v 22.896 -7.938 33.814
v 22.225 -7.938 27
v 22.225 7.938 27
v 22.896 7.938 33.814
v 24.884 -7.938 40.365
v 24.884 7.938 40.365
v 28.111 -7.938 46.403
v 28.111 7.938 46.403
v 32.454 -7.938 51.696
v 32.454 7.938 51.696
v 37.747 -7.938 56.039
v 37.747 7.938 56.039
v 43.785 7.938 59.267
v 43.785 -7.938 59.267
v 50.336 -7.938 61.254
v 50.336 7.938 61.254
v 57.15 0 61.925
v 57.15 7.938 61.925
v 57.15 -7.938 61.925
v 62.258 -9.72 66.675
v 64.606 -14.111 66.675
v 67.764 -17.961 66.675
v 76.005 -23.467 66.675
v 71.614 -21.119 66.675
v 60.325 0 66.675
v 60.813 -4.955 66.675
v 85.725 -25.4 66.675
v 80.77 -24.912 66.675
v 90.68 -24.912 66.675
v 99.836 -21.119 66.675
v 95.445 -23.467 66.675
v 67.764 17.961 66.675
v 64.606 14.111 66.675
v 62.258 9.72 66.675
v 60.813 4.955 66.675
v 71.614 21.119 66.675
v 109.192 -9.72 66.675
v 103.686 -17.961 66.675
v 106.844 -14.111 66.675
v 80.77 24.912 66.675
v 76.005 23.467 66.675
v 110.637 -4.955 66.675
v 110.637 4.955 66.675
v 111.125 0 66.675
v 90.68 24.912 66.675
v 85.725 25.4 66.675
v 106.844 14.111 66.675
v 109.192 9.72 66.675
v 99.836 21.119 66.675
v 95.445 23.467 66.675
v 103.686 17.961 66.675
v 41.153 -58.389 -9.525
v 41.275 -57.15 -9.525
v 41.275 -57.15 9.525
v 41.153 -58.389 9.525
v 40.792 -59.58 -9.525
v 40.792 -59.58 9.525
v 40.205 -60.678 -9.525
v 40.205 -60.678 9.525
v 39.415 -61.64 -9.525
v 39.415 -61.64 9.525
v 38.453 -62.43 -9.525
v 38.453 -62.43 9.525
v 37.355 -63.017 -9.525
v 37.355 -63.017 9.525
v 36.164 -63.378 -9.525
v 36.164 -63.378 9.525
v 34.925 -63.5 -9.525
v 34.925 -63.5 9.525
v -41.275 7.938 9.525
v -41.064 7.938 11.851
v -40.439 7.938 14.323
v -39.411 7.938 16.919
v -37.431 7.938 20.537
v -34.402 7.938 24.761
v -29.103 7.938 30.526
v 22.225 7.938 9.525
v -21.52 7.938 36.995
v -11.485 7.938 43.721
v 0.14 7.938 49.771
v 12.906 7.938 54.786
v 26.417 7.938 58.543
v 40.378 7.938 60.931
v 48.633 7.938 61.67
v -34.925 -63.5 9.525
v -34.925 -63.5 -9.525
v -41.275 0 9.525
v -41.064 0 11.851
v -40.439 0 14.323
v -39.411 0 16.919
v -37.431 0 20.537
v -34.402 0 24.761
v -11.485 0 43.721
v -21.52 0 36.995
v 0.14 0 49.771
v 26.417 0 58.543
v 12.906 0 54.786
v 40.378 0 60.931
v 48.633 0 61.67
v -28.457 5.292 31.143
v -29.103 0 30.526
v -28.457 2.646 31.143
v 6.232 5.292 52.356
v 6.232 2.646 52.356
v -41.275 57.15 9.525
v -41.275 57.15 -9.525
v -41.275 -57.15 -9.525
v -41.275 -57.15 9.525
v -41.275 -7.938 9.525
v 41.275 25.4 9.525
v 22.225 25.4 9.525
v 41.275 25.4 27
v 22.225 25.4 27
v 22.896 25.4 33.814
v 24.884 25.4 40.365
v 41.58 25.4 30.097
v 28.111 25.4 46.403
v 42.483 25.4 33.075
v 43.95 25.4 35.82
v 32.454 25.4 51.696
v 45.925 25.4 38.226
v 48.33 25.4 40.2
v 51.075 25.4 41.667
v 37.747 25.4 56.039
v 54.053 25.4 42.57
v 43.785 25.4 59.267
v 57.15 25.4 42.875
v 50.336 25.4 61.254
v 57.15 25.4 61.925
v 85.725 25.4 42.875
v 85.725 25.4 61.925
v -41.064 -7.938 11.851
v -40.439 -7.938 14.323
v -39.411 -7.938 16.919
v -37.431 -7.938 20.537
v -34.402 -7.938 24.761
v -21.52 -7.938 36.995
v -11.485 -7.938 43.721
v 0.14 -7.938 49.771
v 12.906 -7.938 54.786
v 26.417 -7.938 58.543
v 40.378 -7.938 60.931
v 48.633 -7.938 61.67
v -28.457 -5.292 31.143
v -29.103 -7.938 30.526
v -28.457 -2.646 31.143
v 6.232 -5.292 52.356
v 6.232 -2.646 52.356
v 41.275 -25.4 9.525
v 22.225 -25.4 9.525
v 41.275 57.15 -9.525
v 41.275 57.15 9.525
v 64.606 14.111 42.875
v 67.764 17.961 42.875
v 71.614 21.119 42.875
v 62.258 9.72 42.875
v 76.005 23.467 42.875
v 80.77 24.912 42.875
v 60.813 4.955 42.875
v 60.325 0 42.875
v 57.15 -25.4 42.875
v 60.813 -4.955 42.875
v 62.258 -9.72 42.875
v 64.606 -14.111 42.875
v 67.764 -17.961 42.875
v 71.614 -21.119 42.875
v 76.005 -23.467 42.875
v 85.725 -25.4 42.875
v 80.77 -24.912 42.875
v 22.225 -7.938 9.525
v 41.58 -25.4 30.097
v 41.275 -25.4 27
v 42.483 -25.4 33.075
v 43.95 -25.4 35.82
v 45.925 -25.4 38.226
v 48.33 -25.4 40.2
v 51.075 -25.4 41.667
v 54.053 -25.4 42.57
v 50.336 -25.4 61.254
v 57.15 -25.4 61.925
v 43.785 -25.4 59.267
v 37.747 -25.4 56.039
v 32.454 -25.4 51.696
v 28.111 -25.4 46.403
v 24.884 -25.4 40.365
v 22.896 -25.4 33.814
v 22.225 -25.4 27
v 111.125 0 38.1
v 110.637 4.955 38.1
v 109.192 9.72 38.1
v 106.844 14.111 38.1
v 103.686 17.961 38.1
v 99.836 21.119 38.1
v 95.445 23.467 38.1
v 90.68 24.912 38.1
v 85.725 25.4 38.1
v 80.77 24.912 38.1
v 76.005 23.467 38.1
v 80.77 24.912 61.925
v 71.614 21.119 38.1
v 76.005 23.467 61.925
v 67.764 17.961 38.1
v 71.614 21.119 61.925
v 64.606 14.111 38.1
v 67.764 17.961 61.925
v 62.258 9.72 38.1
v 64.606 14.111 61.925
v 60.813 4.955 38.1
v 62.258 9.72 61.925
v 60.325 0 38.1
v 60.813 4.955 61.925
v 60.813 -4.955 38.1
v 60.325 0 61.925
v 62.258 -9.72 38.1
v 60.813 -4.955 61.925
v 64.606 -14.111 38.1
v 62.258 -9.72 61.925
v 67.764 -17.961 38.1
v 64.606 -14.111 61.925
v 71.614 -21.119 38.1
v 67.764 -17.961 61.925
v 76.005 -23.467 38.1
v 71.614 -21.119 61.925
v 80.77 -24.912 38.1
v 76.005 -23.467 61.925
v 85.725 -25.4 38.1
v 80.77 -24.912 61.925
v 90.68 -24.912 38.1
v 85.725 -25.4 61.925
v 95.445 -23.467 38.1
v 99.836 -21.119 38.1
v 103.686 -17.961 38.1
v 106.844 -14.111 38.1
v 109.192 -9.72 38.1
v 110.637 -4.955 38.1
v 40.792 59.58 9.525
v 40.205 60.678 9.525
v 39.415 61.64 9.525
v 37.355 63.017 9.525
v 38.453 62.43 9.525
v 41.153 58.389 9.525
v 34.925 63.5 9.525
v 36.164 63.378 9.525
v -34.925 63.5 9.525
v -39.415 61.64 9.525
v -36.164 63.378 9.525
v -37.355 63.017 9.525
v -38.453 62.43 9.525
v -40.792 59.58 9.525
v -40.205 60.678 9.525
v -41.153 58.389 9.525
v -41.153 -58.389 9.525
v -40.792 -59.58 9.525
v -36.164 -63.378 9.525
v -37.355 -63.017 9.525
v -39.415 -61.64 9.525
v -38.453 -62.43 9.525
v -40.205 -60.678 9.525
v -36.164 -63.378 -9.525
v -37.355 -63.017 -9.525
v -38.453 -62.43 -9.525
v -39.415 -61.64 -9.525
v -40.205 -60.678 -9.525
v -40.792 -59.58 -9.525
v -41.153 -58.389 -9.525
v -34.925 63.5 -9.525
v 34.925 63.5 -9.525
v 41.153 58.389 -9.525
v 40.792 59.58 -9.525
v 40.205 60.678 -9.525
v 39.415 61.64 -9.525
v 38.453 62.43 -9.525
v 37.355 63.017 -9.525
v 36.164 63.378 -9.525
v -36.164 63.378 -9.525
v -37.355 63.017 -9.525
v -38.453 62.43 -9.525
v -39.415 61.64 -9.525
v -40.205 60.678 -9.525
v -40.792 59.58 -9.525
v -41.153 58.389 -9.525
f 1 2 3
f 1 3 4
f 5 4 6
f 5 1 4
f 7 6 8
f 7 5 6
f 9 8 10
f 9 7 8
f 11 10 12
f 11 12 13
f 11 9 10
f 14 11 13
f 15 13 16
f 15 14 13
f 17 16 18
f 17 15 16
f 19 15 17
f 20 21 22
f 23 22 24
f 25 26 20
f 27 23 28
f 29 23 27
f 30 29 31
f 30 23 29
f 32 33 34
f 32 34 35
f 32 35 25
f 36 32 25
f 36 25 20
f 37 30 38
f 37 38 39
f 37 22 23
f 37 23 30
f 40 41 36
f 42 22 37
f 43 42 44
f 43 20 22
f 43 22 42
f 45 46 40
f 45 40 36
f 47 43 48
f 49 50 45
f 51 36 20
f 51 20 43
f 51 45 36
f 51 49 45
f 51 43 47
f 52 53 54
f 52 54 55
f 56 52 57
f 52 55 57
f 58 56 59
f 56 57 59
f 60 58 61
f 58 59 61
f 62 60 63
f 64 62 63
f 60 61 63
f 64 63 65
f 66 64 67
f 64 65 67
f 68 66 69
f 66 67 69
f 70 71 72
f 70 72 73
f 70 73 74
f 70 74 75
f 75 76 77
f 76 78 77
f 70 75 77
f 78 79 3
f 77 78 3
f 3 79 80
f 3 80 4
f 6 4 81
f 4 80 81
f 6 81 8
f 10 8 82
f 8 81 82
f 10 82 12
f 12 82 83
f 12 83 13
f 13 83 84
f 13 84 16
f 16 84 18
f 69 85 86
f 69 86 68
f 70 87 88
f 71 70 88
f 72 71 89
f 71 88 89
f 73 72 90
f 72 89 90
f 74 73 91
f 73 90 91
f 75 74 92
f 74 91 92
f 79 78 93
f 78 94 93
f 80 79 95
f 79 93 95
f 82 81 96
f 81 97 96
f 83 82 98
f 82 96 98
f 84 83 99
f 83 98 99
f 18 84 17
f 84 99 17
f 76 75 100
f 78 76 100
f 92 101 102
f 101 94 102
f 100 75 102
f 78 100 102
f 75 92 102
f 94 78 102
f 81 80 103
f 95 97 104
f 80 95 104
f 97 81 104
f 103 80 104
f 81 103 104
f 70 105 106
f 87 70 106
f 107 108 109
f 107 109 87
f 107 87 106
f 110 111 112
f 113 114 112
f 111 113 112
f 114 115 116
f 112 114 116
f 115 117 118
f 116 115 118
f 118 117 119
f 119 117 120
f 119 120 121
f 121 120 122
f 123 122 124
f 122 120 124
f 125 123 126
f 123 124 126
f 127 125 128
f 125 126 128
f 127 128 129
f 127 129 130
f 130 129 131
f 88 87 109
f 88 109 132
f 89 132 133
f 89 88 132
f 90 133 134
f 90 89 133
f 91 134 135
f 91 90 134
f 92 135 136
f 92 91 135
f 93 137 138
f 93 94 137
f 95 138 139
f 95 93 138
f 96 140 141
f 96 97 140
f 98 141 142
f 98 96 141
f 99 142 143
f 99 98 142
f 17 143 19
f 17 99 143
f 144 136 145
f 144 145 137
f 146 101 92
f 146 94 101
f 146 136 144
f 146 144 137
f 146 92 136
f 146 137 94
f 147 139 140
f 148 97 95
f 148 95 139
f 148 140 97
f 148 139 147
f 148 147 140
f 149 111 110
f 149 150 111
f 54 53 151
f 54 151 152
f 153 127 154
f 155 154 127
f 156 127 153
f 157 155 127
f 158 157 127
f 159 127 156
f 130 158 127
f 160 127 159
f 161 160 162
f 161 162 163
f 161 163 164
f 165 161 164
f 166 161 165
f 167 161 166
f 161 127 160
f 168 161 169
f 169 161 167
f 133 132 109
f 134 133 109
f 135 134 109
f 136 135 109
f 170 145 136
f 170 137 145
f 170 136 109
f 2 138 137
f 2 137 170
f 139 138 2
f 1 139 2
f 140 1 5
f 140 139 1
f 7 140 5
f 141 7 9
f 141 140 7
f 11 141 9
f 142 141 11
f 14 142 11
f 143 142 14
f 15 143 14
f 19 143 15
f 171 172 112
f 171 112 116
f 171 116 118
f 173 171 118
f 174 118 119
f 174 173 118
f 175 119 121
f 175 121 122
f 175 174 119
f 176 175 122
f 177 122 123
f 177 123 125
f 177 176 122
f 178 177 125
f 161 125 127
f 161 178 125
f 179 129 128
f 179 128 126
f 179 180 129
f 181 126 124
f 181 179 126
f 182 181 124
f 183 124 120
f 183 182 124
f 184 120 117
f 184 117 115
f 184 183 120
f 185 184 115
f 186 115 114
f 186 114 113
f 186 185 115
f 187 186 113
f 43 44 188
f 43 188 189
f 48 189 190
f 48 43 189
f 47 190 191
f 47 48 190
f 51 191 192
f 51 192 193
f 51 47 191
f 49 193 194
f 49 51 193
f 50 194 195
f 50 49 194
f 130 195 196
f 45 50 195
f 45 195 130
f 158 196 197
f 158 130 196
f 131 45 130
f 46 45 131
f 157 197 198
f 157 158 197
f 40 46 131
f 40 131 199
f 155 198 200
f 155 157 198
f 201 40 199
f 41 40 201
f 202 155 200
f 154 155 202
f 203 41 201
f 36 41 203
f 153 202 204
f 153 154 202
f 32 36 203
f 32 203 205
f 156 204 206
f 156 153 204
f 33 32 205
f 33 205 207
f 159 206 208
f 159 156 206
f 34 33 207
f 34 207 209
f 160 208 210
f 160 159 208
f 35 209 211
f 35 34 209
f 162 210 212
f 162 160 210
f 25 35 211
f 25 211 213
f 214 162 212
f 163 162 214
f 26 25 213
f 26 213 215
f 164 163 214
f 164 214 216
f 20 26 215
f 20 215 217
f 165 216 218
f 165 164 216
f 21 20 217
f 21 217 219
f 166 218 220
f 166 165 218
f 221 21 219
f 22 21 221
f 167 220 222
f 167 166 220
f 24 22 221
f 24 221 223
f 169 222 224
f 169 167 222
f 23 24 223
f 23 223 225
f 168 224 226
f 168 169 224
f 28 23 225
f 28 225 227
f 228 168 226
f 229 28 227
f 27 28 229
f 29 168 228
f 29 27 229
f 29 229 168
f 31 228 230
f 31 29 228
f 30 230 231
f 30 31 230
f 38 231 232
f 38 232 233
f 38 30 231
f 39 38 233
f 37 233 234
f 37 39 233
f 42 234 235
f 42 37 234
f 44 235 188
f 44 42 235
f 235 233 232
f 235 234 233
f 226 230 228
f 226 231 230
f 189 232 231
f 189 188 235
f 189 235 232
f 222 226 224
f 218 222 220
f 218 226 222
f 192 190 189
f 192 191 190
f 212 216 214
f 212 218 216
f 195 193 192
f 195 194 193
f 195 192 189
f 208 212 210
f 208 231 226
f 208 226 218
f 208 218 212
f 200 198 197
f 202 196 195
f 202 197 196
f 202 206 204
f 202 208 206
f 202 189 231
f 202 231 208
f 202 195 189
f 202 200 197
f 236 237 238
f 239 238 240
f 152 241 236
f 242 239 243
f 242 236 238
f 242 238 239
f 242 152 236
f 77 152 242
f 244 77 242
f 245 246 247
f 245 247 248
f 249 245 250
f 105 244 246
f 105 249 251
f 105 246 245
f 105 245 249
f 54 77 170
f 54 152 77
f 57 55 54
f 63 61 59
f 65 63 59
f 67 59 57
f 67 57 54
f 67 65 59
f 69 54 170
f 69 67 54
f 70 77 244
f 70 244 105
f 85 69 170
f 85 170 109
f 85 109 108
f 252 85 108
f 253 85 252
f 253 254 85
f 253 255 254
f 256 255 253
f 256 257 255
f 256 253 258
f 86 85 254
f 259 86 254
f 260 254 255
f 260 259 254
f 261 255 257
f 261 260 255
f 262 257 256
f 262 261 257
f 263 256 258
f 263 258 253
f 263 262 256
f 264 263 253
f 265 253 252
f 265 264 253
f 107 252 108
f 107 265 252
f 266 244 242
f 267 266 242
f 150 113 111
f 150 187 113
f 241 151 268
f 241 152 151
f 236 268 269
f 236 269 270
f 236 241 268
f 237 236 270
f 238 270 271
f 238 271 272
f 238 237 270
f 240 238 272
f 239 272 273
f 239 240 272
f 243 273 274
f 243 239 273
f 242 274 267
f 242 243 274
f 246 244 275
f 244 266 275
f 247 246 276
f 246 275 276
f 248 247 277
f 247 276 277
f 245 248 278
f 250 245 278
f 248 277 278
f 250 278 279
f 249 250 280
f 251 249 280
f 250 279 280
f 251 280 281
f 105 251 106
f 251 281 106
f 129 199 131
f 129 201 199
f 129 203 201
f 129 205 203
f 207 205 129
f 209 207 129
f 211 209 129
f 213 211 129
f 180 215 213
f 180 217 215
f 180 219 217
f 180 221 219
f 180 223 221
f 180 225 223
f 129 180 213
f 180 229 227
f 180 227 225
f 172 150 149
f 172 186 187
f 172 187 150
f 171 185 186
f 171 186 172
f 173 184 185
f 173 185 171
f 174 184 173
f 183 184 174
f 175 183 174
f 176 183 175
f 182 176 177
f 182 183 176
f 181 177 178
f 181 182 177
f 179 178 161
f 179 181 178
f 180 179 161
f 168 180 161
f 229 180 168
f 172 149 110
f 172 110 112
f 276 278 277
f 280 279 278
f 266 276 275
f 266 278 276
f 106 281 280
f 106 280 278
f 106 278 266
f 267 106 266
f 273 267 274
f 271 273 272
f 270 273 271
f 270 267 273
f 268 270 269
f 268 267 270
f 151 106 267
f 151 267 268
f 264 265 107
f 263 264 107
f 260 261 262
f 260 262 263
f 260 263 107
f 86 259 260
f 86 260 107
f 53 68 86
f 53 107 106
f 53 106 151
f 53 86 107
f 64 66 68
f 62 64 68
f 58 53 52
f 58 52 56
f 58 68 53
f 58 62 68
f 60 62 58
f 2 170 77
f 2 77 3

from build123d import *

# Parameters (mm, degrees)
F1_DEPTH = 63.5
F0_W     = 25.4
F0_H     = 19.05
F2_DEPTH = 25.4
F3_DEPTH = 7.9375
F5_R     = 6.35


with BuildPart() as f1:
    # F0 (on Front) → F1 (new body, symmetric)
    with BuildSketch(Plane.XZ):
        Polygon((41.275, -9.525), (41.275, 9.525), (22.225, 9.525), (-41.275, 9.525), (-41.275, -9.525), align=None)
    extrude(amount=F1_DEPTH, both=True)

    # F0 (on Front) → F3 (join, symmetric)
    with BuildSketch(Plane.XZ):
        with BuildLine():
            Line((-41.275, 9.525), (22.225, 9.525))
            Line((22.225, 9.525), (22.225, 27.0002))
            ThreePointArc((22.225, 27.0002), (32.4542956671, 51.6959043329), (57.15, 61.9252))
            add(Edge.make_bspline(
                [(-41.275, 9.525), (-41.275, 27.5978259742), (0, 61.9252), (57.15, 61.9252)],
                knots=[0, 0, 0, 0, 111.5045361635, 111.5045361635, 111.5045361635, 111.5045361635], degree=3))
        make_face()
    extrude(amount=F3_DEPTH, both=True)

    # F5
    f5_edges = [f1.edges().sort_by_distance(p)[0] for p in [
        (41.275, -63.5, 0),
        (-41.275, -63.5, 0),
        (41.275, 63.5, 0),
        (-41.275, 63.5, 0),
    ]]
    fillet(f5_edges, radius=F5_R)


with BuildPart() as f2:
    # F0 (on Front) → F2 (new body, symmetric)
    with BuildSketch(Plane.XZ):
        with BuildLine():
            Line((22.225, 9.525), (41.275, 9.525))
            Line((41.275, 9.525), (41.275, 27.0002))
            ThreePointArc((41.275, 27.0002), (45.9246798487, 38.2255201513), (57.15, 42.8752))
            Line((57.15, 42.8752), (60.325, 42.8752))
            Line((60.325, 42.8752), (60.325, 61.9252))
            Line((60.325, 61.9252), (57.15, 61.9252))
            ThreePointArc((57.15, 61.9252), (32.4542956671, 51.6959043329), (22.225, 27.0002))
            Line((22.225, 27.0002), (22.225, 9.525))
        make_face()
        with Locations((73.025, 52.4002)):
            Rectangle(F0_W, F0_H)
    extrude(amount=F2_DEPTH, both=True)

    # F0 (on Front) → F4 (revolve)
    with BuildSketch(Plane.XZ):
        Polygon((85.725, 61.9252), (85.725, 42.8752), (85.725, 38.1), (111.125, 38.1), (111.125, 66.675), (85.725, 66.675), align=None)
    revolve(axis=Axis((85.725, 0, 52.3875), (0, 0, 1)))


solid = Compound([f1.part, f2.part])
